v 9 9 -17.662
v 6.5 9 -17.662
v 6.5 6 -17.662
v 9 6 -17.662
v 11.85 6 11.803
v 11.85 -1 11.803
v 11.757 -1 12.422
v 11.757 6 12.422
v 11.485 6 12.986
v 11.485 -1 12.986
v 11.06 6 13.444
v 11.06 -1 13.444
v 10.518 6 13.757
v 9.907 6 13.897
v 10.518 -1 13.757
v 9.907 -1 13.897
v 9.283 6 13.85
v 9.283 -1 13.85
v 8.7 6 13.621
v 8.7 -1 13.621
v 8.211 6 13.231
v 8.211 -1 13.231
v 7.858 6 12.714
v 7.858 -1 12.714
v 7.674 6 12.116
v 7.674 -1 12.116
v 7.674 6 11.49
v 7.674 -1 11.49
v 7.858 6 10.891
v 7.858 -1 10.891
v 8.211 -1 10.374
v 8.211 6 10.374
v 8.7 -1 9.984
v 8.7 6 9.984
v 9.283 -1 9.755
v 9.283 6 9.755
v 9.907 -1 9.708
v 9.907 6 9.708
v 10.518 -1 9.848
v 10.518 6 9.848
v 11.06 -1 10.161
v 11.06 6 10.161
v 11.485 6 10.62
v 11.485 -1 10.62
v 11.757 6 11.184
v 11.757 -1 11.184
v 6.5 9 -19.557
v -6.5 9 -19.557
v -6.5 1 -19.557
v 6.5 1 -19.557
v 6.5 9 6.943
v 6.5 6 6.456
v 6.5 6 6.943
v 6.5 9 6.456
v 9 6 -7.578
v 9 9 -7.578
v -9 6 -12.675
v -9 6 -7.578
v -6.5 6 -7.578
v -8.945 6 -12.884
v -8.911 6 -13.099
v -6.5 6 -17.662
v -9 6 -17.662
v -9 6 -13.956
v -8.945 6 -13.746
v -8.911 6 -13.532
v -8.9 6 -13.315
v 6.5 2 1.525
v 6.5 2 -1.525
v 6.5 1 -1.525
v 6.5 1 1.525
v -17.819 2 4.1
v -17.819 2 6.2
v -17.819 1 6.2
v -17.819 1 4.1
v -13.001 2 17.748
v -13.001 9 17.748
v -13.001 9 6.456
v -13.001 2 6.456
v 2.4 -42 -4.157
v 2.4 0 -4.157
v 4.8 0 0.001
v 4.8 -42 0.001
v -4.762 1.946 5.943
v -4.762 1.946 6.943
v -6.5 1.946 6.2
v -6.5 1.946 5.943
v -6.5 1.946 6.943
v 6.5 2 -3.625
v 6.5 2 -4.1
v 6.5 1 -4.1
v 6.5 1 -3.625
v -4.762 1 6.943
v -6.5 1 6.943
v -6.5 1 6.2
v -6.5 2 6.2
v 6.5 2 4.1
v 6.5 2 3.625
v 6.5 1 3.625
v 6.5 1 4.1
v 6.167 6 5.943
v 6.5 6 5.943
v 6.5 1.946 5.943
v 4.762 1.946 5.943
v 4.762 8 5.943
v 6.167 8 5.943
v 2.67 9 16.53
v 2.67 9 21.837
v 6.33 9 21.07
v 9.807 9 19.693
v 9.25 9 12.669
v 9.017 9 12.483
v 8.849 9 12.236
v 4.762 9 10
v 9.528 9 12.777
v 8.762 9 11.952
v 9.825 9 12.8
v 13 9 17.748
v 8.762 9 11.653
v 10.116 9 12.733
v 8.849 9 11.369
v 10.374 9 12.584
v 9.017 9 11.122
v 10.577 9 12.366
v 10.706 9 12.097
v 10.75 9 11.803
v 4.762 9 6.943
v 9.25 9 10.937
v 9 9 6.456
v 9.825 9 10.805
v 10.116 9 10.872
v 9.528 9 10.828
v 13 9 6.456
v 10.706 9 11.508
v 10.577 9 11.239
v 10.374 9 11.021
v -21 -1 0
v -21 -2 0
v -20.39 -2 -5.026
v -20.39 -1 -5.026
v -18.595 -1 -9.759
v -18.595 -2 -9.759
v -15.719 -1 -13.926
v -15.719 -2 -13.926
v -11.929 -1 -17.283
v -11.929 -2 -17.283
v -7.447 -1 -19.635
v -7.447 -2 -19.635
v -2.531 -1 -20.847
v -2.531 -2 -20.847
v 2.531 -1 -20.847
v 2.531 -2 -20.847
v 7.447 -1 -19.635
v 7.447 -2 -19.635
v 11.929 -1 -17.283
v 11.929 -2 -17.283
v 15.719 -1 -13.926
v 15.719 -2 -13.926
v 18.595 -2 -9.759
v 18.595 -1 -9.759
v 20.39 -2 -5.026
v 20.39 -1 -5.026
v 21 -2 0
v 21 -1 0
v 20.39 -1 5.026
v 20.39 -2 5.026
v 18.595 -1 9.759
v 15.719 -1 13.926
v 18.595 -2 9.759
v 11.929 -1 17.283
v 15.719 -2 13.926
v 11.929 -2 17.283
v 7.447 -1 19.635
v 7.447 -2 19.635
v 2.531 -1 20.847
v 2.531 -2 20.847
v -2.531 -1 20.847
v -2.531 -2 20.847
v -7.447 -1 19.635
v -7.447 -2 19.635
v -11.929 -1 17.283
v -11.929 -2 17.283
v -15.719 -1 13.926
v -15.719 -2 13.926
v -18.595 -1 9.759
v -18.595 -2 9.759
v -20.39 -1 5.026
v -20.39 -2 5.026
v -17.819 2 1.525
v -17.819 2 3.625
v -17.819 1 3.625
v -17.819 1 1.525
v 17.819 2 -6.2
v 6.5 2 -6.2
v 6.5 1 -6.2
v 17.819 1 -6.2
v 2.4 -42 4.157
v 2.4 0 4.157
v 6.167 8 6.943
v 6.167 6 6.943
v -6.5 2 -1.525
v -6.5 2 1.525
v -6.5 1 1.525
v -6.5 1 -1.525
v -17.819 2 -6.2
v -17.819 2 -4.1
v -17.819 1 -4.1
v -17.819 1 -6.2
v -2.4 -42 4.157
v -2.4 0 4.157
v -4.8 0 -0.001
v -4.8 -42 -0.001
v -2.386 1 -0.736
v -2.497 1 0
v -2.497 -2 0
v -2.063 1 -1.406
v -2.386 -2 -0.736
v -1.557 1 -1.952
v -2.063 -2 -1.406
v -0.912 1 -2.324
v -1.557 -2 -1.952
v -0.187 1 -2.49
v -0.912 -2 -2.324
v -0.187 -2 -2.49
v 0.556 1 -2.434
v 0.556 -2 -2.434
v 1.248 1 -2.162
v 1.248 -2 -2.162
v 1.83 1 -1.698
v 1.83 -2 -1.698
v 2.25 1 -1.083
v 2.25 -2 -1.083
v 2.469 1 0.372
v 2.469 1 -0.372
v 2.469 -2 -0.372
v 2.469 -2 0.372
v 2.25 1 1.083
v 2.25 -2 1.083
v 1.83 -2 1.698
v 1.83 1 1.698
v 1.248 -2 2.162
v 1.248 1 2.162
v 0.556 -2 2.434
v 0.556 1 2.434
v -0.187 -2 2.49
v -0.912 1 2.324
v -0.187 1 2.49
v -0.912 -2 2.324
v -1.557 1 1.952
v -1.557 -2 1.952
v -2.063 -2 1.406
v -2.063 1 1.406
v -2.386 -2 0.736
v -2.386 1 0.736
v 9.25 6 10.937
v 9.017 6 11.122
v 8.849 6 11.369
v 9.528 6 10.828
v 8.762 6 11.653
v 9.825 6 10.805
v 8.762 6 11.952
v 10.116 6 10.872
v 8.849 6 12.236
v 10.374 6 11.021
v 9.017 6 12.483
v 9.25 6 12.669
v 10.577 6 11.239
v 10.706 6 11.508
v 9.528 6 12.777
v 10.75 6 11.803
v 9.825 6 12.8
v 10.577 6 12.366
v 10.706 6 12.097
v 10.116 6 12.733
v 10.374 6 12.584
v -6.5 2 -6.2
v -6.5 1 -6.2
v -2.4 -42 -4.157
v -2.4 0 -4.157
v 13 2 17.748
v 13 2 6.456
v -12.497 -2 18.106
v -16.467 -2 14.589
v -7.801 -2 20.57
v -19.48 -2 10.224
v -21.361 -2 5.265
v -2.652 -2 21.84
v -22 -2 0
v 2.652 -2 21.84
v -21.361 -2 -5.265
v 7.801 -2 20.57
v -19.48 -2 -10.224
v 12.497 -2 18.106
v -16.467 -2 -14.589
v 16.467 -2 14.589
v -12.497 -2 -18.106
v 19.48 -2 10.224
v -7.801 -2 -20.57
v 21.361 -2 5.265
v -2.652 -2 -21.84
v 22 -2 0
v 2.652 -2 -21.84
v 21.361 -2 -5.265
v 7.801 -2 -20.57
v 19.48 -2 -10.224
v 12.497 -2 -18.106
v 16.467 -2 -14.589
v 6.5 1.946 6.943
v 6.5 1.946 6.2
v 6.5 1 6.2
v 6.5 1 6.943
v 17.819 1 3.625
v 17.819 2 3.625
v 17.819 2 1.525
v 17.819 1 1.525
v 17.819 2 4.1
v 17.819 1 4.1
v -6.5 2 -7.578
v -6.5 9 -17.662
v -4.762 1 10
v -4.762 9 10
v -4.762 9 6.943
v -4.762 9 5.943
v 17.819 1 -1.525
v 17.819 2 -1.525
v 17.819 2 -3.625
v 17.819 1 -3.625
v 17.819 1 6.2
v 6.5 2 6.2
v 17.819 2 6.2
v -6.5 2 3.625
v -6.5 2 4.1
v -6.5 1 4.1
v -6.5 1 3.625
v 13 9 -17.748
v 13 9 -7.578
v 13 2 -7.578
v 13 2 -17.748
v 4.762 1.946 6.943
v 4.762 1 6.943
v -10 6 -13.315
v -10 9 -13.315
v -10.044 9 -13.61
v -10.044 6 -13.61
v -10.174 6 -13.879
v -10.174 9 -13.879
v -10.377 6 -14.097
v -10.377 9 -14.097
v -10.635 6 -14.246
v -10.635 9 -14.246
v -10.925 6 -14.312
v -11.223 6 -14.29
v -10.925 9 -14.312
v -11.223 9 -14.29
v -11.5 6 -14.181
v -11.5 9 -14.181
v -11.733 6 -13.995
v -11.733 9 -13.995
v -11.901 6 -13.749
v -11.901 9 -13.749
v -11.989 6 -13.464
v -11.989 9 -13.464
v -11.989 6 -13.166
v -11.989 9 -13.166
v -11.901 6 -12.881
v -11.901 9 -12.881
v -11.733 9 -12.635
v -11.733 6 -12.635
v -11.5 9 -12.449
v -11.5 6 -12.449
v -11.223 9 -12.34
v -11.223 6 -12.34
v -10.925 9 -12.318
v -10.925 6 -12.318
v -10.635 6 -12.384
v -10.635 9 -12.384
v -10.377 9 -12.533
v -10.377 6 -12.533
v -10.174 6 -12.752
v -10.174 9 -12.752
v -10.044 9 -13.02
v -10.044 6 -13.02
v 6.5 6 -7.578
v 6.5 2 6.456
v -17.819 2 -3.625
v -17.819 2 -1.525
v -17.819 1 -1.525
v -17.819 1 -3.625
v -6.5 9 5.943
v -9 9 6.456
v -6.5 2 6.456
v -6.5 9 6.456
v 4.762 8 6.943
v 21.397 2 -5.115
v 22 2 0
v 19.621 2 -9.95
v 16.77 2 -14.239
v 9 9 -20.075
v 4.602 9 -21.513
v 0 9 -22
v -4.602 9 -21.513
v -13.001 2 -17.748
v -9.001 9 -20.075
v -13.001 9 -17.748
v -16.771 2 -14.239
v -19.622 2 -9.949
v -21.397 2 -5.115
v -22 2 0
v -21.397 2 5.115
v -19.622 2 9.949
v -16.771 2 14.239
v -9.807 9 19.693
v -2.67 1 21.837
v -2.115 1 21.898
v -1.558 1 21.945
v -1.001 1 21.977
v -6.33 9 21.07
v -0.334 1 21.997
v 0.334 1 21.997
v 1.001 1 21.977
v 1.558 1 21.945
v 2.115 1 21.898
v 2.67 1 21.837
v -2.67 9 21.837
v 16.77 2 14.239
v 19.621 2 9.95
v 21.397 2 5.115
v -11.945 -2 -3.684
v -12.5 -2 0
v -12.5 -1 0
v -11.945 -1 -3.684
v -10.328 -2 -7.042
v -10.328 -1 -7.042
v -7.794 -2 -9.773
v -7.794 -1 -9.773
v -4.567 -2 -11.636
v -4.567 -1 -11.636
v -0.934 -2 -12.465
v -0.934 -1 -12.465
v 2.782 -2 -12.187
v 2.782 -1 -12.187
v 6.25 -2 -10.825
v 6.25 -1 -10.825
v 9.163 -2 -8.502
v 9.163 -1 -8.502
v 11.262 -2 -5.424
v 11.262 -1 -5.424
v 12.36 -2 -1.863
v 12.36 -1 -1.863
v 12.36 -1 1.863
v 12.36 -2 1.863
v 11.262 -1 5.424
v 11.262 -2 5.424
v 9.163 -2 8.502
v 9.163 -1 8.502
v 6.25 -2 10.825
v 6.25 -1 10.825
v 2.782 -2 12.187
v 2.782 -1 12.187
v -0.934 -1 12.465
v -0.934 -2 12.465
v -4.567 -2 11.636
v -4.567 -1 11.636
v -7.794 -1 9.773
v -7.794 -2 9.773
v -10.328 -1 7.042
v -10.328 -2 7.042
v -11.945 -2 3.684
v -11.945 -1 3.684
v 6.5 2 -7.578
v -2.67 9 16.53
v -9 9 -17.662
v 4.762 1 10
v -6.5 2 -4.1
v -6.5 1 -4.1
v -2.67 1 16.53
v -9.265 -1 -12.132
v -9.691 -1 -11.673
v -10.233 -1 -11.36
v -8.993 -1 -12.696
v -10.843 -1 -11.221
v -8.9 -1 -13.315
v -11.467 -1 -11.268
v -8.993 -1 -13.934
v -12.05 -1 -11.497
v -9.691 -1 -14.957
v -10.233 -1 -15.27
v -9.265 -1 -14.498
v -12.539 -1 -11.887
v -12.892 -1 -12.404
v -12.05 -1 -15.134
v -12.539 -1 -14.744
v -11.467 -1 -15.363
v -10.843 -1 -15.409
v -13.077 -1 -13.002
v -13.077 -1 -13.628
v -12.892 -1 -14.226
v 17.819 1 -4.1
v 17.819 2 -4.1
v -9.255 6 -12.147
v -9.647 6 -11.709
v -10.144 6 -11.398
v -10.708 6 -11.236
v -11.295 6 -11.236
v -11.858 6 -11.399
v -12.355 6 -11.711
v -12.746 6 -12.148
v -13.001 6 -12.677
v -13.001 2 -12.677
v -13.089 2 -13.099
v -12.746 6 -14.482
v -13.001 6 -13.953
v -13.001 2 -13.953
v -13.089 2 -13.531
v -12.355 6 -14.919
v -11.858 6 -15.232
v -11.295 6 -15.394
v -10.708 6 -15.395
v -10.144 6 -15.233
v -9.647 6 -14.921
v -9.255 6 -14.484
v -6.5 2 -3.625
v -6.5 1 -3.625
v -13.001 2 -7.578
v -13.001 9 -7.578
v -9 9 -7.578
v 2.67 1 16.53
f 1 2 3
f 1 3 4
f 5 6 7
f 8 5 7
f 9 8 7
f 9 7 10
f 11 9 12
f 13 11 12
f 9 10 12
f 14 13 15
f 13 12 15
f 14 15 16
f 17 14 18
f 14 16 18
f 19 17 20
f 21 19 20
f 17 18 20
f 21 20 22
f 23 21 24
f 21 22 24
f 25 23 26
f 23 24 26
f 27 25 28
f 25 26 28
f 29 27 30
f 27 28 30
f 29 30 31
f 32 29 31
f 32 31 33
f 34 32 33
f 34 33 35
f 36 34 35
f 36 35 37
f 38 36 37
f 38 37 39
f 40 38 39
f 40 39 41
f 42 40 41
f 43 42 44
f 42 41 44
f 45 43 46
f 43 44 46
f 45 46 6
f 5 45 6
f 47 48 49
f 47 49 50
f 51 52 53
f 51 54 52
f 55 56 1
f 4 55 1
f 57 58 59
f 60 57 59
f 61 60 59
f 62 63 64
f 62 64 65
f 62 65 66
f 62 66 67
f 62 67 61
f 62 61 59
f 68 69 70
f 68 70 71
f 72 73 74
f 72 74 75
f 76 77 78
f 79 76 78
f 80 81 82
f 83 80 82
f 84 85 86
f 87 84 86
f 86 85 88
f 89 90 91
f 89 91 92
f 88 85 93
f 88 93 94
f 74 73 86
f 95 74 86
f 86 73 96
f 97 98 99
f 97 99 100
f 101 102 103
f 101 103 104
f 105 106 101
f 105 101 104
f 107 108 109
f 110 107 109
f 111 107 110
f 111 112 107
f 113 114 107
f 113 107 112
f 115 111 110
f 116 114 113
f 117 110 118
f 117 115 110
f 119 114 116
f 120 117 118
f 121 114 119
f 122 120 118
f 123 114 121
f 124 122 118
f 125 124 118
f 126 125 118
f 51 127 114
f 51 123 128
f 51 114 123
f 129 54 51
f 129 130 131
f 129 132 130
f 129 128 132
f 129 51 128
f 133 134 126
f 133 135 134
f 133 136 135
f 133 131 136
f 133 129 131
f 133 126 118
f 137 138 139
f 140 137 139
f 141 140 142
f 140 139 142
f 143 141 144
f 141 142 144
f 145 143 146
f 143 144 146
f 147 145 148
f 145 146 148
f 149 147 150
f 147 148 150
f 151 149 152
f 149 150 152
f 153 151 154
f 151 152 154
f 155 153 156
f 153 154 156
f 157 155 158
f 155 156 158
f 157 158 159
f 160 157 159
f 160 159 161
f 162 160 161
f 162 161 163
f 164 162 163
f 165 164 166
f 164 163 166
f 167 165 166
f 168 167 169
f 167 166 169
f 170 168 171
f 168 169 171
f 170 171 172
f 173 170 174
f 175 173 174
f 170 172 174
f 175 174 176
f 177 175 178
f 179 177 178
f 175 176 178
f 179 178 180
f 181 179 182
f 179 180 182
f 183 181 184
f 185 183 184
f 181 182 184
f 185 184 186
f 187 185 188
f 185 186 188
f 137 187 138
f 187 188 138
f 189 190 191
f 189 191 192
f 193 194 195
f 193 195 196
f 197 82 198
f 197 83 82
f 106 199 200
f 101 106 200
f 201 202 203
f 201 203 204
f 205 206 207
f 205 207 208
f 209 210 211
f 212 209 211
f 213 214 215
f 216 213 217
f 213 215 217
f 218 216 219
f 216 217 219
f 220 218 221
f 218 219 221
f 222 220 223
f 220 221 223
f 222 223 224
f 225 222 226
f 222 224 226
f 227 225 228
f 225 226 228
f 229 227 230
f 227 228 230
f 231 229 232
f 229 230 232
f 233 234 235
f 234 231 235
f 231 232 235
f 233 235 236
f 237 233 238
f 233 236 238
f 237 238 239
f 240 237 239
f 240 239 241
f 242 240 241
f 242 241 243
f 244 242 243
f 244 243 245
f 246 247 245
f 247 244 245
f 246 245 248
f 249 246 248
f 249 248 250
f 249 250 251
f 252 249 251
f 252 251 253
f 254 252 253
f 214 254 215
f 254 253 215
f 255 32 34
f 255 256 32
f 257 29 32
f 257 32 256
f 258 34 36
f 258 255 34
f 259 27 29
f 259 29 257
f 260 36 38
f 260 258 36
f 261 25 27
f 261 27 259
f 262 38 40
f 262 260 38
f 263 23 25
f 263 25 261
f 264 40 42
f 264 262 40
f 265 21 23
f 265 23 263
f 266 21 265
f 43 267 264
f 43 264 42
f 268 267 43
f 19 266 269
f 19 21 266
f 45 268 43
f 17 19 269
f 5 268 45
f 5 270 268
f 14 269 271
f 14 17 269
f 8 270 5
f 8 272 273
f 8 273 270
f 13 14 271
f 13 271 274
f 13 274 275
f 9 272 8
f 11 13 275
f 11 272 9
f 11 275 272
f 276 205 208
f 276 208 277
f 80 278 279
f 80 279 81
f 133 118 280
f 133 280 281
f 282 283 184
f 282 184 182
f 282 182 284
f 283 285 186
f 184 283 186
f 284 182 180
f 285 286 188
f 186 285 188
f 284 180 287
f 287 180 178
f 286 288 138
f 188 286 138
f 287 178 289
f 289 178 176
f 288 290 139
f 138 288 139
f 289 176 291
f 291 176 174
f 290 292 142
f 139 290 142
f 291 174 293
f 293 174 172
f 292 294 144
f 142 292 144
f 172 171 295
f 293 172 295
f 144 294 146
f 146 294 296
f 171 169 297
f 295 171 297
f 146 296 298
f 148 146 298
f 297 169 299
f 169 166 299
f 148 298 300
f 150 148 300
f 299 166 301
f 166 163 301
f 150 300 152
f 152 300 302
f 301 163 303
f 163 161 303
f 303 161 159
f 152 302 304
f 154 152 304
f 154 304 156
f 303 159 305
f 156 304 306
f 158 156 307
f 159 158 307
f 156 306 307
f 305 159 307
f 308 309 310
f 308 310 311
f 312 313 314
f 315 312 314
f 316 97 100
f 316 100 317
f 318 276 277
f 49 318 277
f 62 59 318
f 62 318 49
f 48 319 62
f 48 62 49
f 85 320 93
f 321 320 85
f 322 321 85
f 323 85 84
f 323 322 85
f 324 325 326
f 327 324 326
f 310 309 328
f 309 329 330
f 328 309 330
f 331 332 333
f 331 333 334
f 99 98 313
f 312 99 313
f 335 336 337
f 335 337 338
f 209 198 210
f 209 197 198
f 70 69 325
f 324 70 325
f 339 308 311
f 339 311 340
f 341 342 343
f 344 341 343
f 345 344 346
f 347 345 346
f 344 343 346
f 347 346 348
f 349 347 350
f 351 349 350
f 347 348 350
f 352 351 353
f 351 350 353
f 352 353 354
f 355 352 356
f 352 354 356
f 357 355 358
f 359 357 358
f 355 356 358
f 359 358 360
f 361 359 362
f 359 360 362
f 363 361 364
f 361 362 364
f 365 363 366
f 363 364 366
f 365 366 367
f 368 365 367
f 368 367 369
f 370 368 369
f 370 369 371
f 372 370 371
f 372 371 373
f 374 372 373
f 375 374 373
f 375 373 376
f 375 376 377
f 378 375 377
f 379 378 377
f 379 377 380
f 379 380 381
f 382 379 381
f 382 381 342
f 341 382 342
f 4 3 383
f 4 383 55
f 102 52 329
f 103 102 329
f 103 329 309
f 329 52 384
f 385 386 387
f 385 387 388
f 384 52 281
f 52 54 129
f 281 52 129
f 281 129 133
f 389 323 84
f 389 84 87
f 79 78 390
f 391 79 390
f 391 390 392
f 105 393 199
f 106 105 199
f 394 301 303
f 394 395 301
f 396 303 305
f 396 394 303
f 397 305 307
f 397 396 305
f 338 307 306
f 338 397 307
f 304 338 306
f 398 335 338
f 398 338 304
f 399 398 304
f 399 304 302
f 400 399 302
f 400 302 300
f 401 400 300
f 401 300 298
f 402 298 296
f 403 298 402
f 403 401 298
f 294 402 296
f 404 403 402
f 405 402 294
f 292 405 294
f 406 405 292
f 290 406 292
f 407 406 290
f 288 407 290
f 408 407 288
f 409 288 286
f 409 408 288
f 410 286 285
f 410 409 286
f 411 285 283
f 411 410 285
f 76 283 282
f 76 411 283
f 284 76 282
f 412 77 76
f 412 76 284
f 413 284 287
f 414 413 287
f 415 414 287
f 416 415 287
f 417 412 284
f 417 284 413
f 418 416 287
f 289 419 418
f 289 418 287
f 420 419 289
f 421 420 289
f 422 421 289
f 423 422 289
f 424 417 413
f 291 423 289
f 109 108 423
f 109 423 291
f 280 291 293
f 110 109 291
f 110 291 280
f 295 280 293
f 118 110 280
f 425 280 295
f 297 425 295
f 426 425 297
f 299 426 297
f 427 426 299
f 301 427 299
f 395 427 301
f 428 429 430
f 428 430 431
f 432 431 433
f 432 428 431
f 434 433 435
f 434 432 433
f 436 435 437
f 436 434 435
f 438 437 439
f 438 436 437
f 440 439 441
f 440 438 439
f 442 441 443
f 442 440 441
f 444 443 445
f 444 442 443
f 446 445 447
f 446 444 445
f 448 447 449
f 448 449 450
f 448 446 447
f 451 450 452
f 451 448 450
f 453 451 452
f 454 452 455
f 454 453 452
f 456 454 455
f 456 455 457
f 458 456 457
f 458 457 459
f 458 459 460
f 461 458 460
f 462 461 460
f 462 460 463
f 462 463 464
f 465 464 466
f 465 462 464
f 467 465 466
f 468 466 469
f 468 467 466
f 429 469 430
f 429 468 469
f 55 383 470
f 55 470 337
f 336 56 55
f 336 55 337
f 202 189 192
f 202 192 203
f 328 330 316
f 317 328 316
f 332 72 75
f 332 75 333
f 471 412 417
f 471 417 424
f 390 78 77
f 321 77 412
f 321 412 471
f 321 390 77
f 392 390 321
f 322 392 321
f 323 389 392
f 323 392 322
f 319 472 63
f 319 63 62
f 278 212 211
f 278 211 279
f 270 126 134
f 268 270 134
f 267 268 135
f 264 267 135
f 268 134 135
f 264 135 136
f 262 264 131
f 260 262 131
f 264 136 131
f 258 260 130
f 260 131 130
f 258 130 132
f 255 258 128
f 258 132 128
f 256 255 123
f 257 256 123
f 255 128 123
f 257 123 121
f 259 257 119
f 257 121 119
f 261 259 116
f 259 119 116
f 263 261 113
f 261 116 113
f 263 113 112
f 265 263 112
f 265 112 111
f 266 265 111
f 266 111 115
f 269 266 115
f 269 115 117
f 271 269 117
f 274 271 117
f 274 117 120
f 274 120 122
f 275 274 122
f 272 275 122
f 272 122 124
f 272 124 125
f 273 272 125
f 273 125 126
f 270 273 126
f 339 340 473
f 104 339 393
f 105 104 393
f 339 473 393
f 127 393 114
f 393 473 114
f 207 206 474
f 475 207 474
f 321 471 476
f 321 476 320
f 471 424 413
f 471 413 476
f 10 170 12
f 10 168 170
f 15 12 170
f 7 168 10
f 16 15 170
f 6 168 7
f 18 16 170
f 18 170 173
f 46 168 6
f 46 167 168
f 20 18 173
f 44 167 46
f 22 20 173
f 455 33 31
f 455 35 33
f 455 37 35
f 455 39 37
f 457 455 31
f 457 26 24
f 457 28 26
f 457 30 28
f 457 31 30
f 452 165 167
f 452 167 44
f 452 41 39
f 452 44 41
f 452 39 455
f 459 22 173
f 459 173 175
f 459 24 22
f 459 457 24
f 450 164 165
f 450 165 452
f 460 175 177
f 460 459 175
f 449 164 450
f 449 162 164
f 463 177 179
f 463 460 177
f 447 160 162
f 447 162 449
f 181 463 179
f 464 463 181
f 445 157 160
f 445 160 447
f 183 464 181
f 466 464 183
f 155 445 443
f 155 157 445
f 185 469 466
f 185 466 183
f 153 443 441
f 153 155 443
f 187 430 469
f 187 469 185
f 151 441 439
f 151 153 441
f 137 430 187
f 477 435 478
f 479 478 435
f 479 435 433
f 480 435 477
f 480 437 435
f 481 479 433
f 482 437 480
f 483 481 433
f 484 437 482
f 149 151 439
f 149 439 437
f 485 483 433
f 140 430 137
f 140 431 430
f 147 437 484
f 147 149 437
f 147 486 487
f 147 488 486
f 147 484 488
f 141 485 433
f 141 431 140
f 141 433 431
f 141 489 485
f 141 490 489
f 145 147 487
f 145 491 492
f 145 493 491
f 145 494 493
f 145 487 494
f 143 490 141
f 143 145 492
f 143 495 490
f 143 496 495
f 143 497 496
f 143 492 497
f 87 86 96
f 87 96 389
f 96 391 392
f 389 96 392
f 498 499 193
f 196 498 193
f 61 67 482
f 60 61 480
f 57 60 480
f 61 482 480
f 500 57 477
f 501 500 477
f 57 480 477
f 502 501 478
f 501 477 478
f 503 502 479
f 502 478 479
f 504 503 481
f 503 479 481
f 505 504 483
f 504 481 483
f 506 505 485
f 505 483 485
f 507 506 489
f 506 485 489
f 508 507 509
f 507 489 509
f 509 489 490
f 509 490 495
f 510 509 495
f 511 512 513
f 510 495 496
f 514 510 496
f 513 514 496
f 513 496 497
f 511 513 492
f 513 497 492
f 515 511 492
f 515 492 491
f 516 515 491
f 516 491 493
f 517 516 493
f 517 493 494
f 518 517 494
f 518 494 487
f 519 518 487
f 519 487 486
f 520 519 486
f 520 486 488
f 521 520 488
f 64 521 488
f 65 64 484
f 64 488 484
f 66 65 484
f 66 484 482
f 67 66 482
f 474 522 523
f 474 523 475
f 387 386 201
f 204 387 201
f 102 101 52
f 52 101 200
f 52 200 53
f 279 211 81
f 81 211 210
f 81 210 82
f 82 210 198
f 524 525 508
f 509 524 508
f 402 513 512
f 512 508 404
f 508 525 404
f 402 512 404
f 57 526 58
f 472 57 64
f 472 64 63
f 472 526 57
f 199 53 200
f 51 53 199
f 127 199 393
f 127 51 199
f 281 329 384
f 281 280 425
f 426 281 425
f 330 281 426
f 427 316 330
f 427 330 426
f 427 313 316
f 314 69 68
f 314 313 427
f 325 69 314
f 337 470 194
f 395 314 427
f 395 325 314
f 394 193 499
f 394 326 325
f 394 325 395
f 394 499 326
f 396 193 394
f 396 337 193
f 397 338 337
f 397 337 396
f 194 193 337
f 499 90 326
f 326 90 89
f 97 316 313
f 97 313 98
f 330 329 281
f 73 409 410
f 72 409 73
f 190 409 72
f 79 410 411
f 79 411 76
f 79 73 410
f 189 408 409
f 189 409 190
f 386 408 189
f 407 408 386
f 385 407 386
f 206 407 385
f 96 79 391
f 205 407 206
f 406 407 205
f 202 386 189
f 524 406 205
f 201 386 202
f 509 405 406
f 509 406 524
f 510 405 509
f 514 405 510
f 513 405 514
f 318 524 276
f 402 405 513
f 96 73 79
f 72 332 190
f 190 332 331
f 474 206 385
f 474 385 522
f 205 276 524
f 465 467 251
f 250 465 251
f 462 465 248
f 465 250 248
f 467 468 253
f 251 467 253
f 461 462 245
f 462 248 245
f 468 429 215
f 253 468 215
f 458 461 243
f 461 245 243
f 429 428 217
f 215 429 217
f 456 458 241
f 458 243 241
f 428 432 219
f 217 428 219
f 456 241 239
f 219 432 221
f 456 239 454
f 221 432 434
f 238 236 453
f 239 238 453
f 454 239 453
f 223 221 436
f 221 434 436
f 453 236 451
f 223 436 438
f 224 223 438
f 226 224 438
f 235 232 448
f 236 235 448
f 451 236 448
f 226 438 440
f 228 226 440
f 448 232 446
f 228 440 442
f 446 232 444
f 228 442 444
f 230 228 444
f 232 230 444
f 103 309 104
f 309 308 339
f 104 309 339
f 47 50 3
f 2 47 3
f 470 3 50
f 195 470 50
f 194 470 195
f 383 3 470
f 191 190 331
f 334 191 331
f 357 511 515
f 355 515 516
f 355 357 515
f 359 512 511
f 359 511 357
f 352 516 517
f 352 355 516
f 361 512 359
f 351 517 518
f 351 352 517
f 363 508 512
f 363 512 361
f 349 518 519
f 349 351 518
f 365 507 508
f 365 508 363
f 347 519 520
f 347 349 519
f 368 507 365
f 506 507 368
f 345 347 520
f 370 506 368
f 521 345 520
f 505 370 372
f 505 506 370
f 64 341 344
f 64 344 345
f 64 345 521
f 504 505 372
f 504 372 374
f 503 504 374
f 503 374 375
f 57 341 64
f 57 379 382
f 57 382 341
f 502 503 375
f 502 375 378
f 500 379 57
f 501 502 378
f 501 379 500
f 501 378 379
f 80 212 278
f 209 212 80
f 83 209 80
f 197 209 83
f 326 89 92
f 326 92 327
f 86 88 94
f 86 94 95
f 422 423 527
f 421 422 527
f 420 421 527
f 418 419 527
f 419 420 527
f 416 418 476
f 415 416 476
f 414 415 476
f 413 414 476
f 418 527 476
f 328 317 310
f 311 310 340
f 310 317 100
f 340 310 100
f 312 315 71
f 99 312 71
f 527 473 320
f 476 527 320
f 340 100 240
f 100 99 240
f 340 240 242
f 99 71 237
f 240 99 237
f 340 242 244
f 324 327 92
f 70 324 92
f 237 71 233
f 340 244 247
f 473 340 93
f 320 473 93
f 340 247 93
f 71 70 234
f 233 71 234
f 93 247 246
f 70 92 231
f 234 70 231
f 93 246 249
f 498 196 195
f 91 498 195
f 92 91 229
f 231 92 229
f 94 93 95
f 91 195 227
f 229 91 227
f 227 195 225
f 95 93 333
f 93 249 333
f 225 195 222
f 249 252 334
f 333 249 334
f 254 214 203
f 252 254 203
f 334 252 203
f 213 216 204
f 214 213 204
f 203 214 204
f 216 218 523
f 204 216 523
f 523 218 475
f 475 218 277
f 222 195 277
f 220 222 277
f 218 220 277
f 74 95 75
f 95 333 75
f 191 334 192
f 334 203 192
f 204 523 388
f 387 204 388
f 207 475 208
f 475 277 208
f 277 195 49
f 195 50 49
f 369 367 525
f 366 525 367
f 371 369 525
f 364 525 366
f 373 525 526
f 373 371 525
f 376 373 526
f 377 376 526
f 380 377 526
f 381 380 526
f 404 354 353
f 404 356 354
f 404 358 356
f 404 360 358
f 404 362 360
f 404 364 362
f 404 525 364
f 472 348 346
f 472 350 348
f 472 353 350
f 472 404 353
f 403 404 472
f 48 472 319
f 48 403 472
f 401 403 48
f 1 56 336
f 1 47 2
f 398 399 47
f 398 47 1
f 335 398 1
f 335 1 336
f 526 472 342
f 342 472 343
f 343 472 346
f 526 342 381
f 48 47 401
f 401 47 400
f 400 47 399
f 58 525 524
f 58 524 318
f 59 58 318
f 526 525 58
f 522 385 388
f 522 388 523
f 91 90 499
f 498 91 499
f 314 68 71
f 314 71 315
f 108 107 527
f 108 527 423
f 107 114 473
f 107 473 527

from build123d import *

# Parameters (mm, degrees)
SKETCH1_R                = 22
BOSS_EXTRUDE1_DEPTH      = 9
BOSS_EXTRUDE1_DEPTH_BACK = 2
SKETCH6_R                = 21
SKETCH6_R_2              = 12.5
CUT_EXTRUDE5_DEPTH       = 1
SKETCH7_R                = 8.5
BOSS_EXTRUDE2_DEPTH      = 40
SKETCH8_R                = 1.5
CUT_EXTRUDE6_DEPTH       = 41
CUT_EXTRUDE6_DEPTH_BACK  = 12
CUT_EXTRUDE7_DEPTH       = 7
SKETCH17_R               = 2.496785081
CUT_EXTRUDE14_DEPTH      = 62
SKETCH29_W               = 18
SKETCH29_H               = 24.118038922
CUT_EXTRUDE19_DEPTH      = 3
SKETCH30_W               = 2.5
SKETCH30_H               = 14
CUT_EXTRUDE20_DEPTH      = 6
SKETCH35_R               = 9.1
SKETCH35_R_2             = 8.5
BOSS_EXTRUDE4_DEPTH      = 2
BOSS_EXTRUDE4_DEPTH_BACK = 2
SKETCH36_R               = 8.5
SKETCH36_R_2             = 8.3
CUT_EXTRUDE28_DEPTH      = 1.5
CUT_EXTRUDE28_DEPTH_BACK = 1.5
SKETCH39_R               = 8.5
SKETCH39_R_2             = 8.3
CUT_EXTRUDE30_DEPTH      = 1.5
CUT_EXTRUDE30_DEPTH_BACK = 1.5
SKETCH40_R               = 8.5
SKETCH40_R_2             = 8.3
CUT_EXTRUDE31_DEPTH      = 1.5
CUT_EXTRUDE31_DEPTH_BACK = 1.5
SKETCH41_R               = 8.5
SKETCH41_R_2             = 8.35
CUT_EXTRUDE32_DEPTH      = 1.5
CUT_EXTRUDE32_DEPTH_BACK = 1.5
SKETCH42_R               = 8.5
SKETCH42_R_2             = 8.3
CUT_EXTRUDE33_DEPTH      = 1.5
CUT_EXTRUDE33_DEPTH_BACK = 1.5
SKETCH43_R               = 8.5
SKETCH43_R_2             = 8.3
CUT_EXTRUDE34_DEPTH      = 1.5
CUT_EXTRUDE34_DEPTH_BACK = 1.5
SKETCH44_R               = 1
CUT_EXTRUDE35_DEPTH      = 23
CUT_EXTRUDE35_DEPTH_BACK = 23
SKETCH45_R               = 1
CUT_EXTRUDE36_DEPTH      = 31.052558883
CUT_EXTRUDE36_DEPTH_BACK = 31.052558883
SKETCH46_R               = 1
CUT_EXTRUDE37_DEPTH      = 31.052558883
CUT_EXTRUDE37_DEPTH_BACK = 31.052558883
SKETCH47_W               = 27.732128476
SKETCH47_H               = 14.033639909
CUT_EXTRUDE38_DEPTH      = 7
CUT_EXTRUDE39_DEPTH      = 8
SKETCH48_R               = 1
CUT_EXTRUDE40_DEPTH      = 9
SKETCH50_R               = 6.388253867
BOSS_EXTRUDE5_DEPTH      = 2
SKETCH49_R               = 2.1
CUT_EXTRUDE42_DEPTH      = 7
SKETCH51_W               = 35.63730279
SKETCH51_H               = 2.1
CUT_EXTRUDE43_DEPTH      = 1
SKETCH53_R               = 9.1
CUT_EXTRUDE45_DEPTH      = 40
SKETCH55_W               = 1.737607108
SKETCH55_H               = 7.054348591
BOSS_EXTRUDE6_DEPTH      = 1
BOSS_EXTRUDE9_DEPTH      = 40
BOSS_EXTRUDE9_DEPTH_BACK = 2


with BuildPart() as part:
    # Sketch1 → Boss-Extrude1 (new body, two sides)
    with BuildSketch(Plane(origin=(0, 0, 0), x_dir=(1, 0, 0), z_dir=(0, 1, 0))) as boss_extrude1_sk:
        Circle(SKETCH1_R)
    extrude(amount=BOSS_EXTRUDE1_DEPTH)
    extrude(boss_extrude1_sk.sketch, amount=-BOSS_EXTRUDE1_DEPTH_BACK)

    # Sketch6 → Cut-Extrude5 (cut)
    with BuildSketch(Plane(origin=(0, -2, 0), x_dir=(-1, 0, 0), z_dir=(0, -1, 0))):
        Circle(SKETCH6_R)
        Circle(SKETCH6_R_2, mode=Mode.SUBTRACT)
    extrude(amount=-CUT_EXTRUDE5_DEPTH, mode=Mode.SUBTRACT)

    # Sketch7 → Boss-Extrude2 (add)
    with BuildSketch(Plane(origin=(0, -2, 0), x_dir=(-1, 0, 0), z_dir=(0, -1, 0))):
        Circle(SKETCH7_R)
    extrude(amount=BOSS_EXTRUDE2_DEPTH)

    # Sketch8 → Cut-Extrude6 (cut, two sides)
    with BuildSketch(Plane(origin=(0, -2, 0), x_dir=(-1, 0, 0), z_dir=(0, -1, 0))) as cut_extrude6_sk:
        Circle(SKETCH8_R)
    extrude(amount=CUT_EXTRUDE6_DEPTH, mode=Mode.SUBTRACT)
    extrude(cut_extrude6_sk.sketch, amount=-CUT_EXTRUDE6_DEPTH_BACK, mode=Mode.SUBTRACT)

    # Sketch9 → Cut-Extrude7 (cut)
    with BuildSketch(Plane(origin=(0, 9, 0), x_dir=(1, 0, 0), z_dir=(0, 1, 0))):
        with BuildLine():
            Line((-13.000713231, -20.359249211), (-13.000713231, 20.359249211))
            ThreePointArc((-13.000713231, 20.359249211), (-24.156108398, 0), (-13.000713231, -20.359249211))
        make_face()
        with BuildLine():
            Line((13, -20.359704638), (13, 20.359704638))
            ThreePointArc((13, 20.359704638), (24.156108398, 0), (13, -20.359704638))
        make_face()
    extrude(amount=-CUT_EXTRUDE7_DEPTH, mode=Mode.SUBTRACT)

    # Sketch17 → Cut-Extrude14 (cut)
    with BuildSketch(Plane(origin=(0, -42, 0), x_dir=(-1, 0, 0), z_dir=(0, -1, 0))):
        Circle(SKETCH17_R)
    extrude(amount=-CUT_EXTRUDE14_DEPTH, mode=Mode.SUBTRACT)

    # Sketch29 → Cut-Extrude19 (cut)
    with BuildSketch(Plane(origin=(0, 9, 0), x_dir=(1, 0, 0), z_dir=(0, 1, 0))):
        with Locations((0, 5.603215798)):
            Rectangle(SKETCH29_W, SKETCH29_H)
    extrude(amount=-CUT_EXTRUDE19_DEPTH, mode=Mode.SUBTRACT)

    # Sketch30 → Cut-Extrude20 (cut)
    with BuildSketch(Plane(origin=(0, 9, 0), x_dir=(1, 0, 0), z_dir=(0, 1, 0))):
        with Locations((6.752146467, 0.544196337)):
            Rectangle(SKETCH30_W, SKETCH30_H)
        with Locations((-6.752146467, 0.544196337)):
            Rectangle(SKETCH30_W, SKETCH30_H)
    extrude(amount=-CUT_EXTRUDE20_DEPTH, mode=Mode.SUBTRACT)

    # Sketch35 → Boss-Extrude4 (add, two sides)
    with BuildSketch(Plane(origin=(0, -6.5, 0), x_dir=(1, 0, 0), z_dir=(0, 1, 0))) as boss_extrude4_sk:
        Circle(SKETCH35_R)
        Circle(SKETCH35_R_2, mode=Mode.SUBTRACT)
    extrude(amount=BOSS_EXTRUDE4_DEPTH)
    extrude(boss_extrude4_sk.sketch, amount=-BOSS_EXTRUDE4_DEPTH_BACK)

    # Sketch36 → Cut-Extrude28 (cut, two sides)
    with BuildSketch(Plane(origin=(0, -17, 0), x_dir=(1, 0, 0), z_dir=(0, 1, 0))) as cut_extrude28_sk:
        Circle(SKETCH36_R)
        Circle(SKETCH36_R_2, mode=Mode.SUBTRACT)
    extrude(amount=CUT_EXTRUDE28_DEPTH, mode=Mode.SUBTRACT)
    extrude(cut_extrude28_sk.sketch, amount=-CUT_EXTRUDE28_DEPTH_BACK, mode=Mode.SUBTRACT)

    # Sketch39 → Cut-Extrude30 (cut, two sides)
    with BuildSketch(Plane(origin=(0, -21, 0), x_dir=(1, 0, 0), z_dir=(0, 1, 0))) as cut_extrude30_sk:
        Circle(SKETCH39_R)
        Circle(SKETCH39_R_2, mode=Mode.SUBTRACT)
    extrude(amount=CUT_EXTRUDE30_DEPTH, mode=Mode.SUBTRACT)
    extrude(cut_extrude30_sk.sketch, amount=-CUT_EXTRUDE30_DEPTH_BACK, mode=Mode.SUBTRACT)

    # Sketch40 → Cut-Extrude31 (cut, two sides)
    with BuildSketch(Plane(origin=(0, -25, 0), x_dir=(1, 0, 0), z_dir=(0, 1, 0))) as cut_extrude31_sk:
        Circle(SKETCH40_R)
        Circle(SKETCH40_R_2, mode=Mode.SUBTRACT)
    extrude(amount=CUT_EXTRUDE31_DEPTH, mode=Mode.SUBTRACT)
    extrude(cut_extrude31_sk.sketch, amount=-CUT_EXTRUDE31_DEPTH_BACK, mode=Mode.SUBTRACT)

    # Sketch41 → Cut-Extrude32 (cut, two sides)
    with BuildSketch(Plane(origin=(0, -29, 0), x_dir=(1, 0, 0), z_dir=(0, 1, 0))) as cut_extrude32_sk:
        Circle(SKETCH41_R)
        Circle(SKETCH41_R_2, mode=Mode.SUBTRACT)
    extrude(amount=CUT_EXTRUDE32_DEPTH, mode=Mode.SUBTRACT)
    extrude(cut_extrude32_sk.sketch, amount=-CUT_EXTRUDE32_DEPTH_BACK, mode=Mode.SUBTRACT)

    # Sketch42 → Cut-Extrude33 (cut, two sides)
    with BuildSketch(Plane(origin=(0, -33, 0), x_dir=(1, 0, 0), z_dir=(0, 1, 0))) as cut_extrude33_sk:
        Circle(SKETCH42_R)
        Circle(SKETCH42_R_2, mode=Mode.SUBTRACT)
    extrude(amount=CUT_EXTRUDE33_DEPTH, mode=Mode.SUBTRACT)
    extrude(cut_extrude33_sk.sketch, amount=-CUT_EXTRUDE33_DEPTH_BACK, mode=Mode.SUBTRACT)

    # Sketch43 → Cut-Extrude34 (cut, two sides)
    with BuildSketch(Plane(origin=(0, -37, 0), x_dir=(1, 0, 0), z_dir=(0, 1, 0))) as cut_extrude34_sk:
        Circle(SKETCH43_R)
        Circle(SKETCH43_R_2, mode=Mode.SUBTRACT)
    extrude(amount=CUT_EXTRUDE34_DEPTH, mode=Mode.SUBTRACT)
    extrude(cut_extrude34_sk.sketch, amount=-CUT_EXTRUDE34_DEPTH_BACK, mode=Mode.SUBTRACT)

    # Sketch44 → Cut-Extrude35 (cut, two sides)
    with BuildSketch(Plane.XY) as cut_extrude35_sk:
        with Locations((0, -16.975647938)):
            Circle(SKETCH44_R)
        with Locations((0, -29.042179734)):
            Circle(SKETCH44_R)
    extrude(amount=CUT_EXTRUDE35_DEPTH, mode=Mode.SUBTRACT)
    extrude(cut_extrude35_sk.sketch, amount=-CUT_EXTRUDE35_DEPTH_BACK, mode=Mode.SUBTRACT)

    # Sketch45 → Cut-Extrude36 (cut, two sides)
    with BuildSketch(Plane(origin=(0, 0, 0), x_dir=(0, 1, 0), z_dir=(0.866025404, 0, 0.5))) as cut_extrude36_sk:
        with Locations((-21.101513607, 0)):
            Circle(SKETCH45_R)
        with Locations((-33.049455879, 0)):
            Circle(SKETCH45_R)
    extrude(amount=CUT_EXTRUDE36_DEPTH, mode=Mode.SUBTRACT)
    extrude(cut_extrude36_sk.sketch, amount=-CUT_EXTRUDE36_DEPTH_BACK, mode=Mode.SUBTRACT)

    # Sketch46 → Cut-Extrude37 (cut, two sides)
    with BuildSketch(Plane(origin=(0, 0, 0), x_dir=(0, 1, 0), z_dir=(0.866025404, 0, -0.5))) as cut_extrude37_sk:
        with Locations((-24.961001523, 0)):
            Circle(SKETCH46_R)
        with Locations((-37.130366549, 0)):
            Circle(SKETCH46_R)
    extrude(amount=CUT_EXTRUDE37_DEPTH, mode=Mode.SUBTRACT)
    extrude(cut_extrude37_sk.sketch, amount=-CUT_EXTRUDE37_DEPTH_BACK, mode=Mode.SUBTRACT)

    # Sketch47 → Cut-Extrude38 (cut)
    with BuildSketch(Plane(origin=(0, 9, 0), x_dir=(1, 0, 0), z_dir=(0, 1, 0))):
        with Locations((-0.011675811, 0.561016292)):
            Rectangle(SKETCH47_W, SKETCH47_H)
    extrude(amount=-CUT_EXTRUDE38_DEPTH, mode=Mode.SUBTRACT)

    # Sketch23 → Cut-Extrude39 (cut)
    with BuildSketch(Plane(origin=(0, 9, 0), x_dir=(1, 0, 0), z_dir=(0, 1, 0))):
        with BuildLine():
            Line((-2.670420152, -16.85816067), (-2.670420152, -16.530371213))
            Line((-2.670420152, -16.530371213), (-4.762392892, -10))
            Line((-4.762392892, -10), (-4.762392892, -6.943148259))
            Line((-4.762392892, -6.943148259), (-6.5, -6.943148259))
            Line((-6.5, -6.943148259), (-6.5, 19.556851741))
            Line((-6.5, 19.556851741), (6.5, 19.556851741))
            Line((6.5, 19.556851741), (6.5, -6.943148259))
            Line((6.5, -6.943148259), (4.762392892, -6.943148259))
            Line((4.762392892, -6.943148259), (4.762392892, -10))
            Line((4.762392892, -10), (2.670420152, -16.530371213))
            Line((2.670420152, -16.530371213), (2.670420152, -16.85816067))
            Line((2.670420152, -16.85816067), (2.670420152, -21.837327131))
            ThreePointArc((2.670420152, -21.837327131), (1.836835043, -21.92318492), (1.000584871, -21.977234355))
            Line((1.000584871, -21.977234355), (0, -25.25))
            Line((0, -25.25), (-1.000584871, -21.977234355))
            ThreePointArc((-1.000584871, -21.977234355), (-1.836835043, -21.92318492), (-2.670420152, -21.837327131))
            Line((-2.670420152, -21.837327131), (-2.670420152, -16.85816067))
        make_face()
    extrude(amount=-CUT_EXTRUDE39_DEPTH, mode=Mode.SUBTRACT)

    # Sketch48 → Cut-Extrude40 (cut)
    with BuildSketch(Plane(origin=(0, 9, 0), x_dir=(1, 0, 0), z_dir=(0, 1, 0))):
        with Locations((-11, 13.315197565)):
            Circle(SKETCH48_R)
        with Locations((9.750356615, -11.802538605)):
            Circle(SKETCH48_R)
    extrude(amount=-CUT_EXTRUDE40_DEPTH, mode=Mode.SUBTRACT)

    # Sketch50 → Boss-Extrude5 (add)
    with BuildSketch(Plane.XZ.offset(42)):
        Circle(SKETCH50_R)
        Polygon((-4.989659815, -0.000576747), (-2.49433043, -4.321460529), (2.495329385, -4.320883782), (4.989659815, 0.000576747), (2.49433043, 4.321460529), (-2.495329385, 4.320883782), align=None, mode=Mode.SUBTRACT)
    extrude(amount=-BOSS_EXTRUDE5_DEPTH)

    # Sketch49 → Cut-Extrude42 (cut)
    with BuildSketch(Plane.XZ.offset(1)):
        with Locations((-11, -13.315197565)):
            Circle(SKETCH49_R)
        with Locations((9.750356615, 11.802538605)):
            Circle(SKETCH49_R)
    extrude(amount=-CUT_EXTRUDE42_DEPTH, mode=Mode.SUBTRACT)

    # Sketch51 → Cut-Extrude43 (cut)
    with BuildSketch(Plane(origin=(0, 2, 0), x_dir=(1, 0, 0), z_dir=(0, 1, 0))):
        with Locations((0, 5.15)):
            Rectangle(SKETCH51_W, SKETCH51_H)
        with Locations((0, 2.575)):
            Rectangle(SKETCH51_W, SKETCH51_H)
        with Locations((0, -2.575)):
            Rectangle(SKETCH51_W, SKETCH51_H)
        with Locations((0, -5.15)):
            Rectangle(SKETCH51_W, SKETCH51_H)
    extrude(amount=-CUT_EXTRUDE43_DEPTH, mode=Mode.SUBTRACT)

    # Sketch53 → Cut-Extrude45 (cut)
    with BuildSketch(Plane.XZ.offset(42)):
        Circle(SKETCH53_R)
    extrude(amount=-CUT_EXTRUDE45_DEPTH, mode=Mode.SUBTRACT)

    # Sketch55 → Boss-Extrude6 (add)
    with BuildSketch(Plane(origin=(0, 0, 6.943148259), x_dir=(-1, 0, 0), z_dir=(0, 0, -1))):
        Polygon((-4.762392892, 8), (-6.167287474, 8), (-6.167287474, 6), (-6.5, 6), (-6.5, 1.945651409), (-4.762392892, 1.945651409), align=None)
        with Locations((5.631196446, 5.472825704)):
            Rectangle(SKETCH55_W, SKETCH55_H)
    extrude(amount=BOSS_EXTRUDE6_DEPTH)


with BuildPart() as body_2:
    # Sketch56 → Boss-Extrude9 (new body, two sides)
    with BuildSketch(Plane.XZ.offset(2)) as boss_extrude9_sk:
        Polygon((2.399519492, 4.157199323), (-2.400480476, 4.156644498), (-4.799999968, -0.000554824), (-2.399519492, -4.157199323), (2.400480476, -4.156644498), (4.799999968, 0.000554824), align=None)
    extrude(amount=BOSS_EXTRUDE9_DEPTH)
    extrude(boss_extrude9_sk.sketch, amount=-BOSS_EXTRUDE9_DEPTH_BACK)


solid = Compound([part.part, body_2.part])
